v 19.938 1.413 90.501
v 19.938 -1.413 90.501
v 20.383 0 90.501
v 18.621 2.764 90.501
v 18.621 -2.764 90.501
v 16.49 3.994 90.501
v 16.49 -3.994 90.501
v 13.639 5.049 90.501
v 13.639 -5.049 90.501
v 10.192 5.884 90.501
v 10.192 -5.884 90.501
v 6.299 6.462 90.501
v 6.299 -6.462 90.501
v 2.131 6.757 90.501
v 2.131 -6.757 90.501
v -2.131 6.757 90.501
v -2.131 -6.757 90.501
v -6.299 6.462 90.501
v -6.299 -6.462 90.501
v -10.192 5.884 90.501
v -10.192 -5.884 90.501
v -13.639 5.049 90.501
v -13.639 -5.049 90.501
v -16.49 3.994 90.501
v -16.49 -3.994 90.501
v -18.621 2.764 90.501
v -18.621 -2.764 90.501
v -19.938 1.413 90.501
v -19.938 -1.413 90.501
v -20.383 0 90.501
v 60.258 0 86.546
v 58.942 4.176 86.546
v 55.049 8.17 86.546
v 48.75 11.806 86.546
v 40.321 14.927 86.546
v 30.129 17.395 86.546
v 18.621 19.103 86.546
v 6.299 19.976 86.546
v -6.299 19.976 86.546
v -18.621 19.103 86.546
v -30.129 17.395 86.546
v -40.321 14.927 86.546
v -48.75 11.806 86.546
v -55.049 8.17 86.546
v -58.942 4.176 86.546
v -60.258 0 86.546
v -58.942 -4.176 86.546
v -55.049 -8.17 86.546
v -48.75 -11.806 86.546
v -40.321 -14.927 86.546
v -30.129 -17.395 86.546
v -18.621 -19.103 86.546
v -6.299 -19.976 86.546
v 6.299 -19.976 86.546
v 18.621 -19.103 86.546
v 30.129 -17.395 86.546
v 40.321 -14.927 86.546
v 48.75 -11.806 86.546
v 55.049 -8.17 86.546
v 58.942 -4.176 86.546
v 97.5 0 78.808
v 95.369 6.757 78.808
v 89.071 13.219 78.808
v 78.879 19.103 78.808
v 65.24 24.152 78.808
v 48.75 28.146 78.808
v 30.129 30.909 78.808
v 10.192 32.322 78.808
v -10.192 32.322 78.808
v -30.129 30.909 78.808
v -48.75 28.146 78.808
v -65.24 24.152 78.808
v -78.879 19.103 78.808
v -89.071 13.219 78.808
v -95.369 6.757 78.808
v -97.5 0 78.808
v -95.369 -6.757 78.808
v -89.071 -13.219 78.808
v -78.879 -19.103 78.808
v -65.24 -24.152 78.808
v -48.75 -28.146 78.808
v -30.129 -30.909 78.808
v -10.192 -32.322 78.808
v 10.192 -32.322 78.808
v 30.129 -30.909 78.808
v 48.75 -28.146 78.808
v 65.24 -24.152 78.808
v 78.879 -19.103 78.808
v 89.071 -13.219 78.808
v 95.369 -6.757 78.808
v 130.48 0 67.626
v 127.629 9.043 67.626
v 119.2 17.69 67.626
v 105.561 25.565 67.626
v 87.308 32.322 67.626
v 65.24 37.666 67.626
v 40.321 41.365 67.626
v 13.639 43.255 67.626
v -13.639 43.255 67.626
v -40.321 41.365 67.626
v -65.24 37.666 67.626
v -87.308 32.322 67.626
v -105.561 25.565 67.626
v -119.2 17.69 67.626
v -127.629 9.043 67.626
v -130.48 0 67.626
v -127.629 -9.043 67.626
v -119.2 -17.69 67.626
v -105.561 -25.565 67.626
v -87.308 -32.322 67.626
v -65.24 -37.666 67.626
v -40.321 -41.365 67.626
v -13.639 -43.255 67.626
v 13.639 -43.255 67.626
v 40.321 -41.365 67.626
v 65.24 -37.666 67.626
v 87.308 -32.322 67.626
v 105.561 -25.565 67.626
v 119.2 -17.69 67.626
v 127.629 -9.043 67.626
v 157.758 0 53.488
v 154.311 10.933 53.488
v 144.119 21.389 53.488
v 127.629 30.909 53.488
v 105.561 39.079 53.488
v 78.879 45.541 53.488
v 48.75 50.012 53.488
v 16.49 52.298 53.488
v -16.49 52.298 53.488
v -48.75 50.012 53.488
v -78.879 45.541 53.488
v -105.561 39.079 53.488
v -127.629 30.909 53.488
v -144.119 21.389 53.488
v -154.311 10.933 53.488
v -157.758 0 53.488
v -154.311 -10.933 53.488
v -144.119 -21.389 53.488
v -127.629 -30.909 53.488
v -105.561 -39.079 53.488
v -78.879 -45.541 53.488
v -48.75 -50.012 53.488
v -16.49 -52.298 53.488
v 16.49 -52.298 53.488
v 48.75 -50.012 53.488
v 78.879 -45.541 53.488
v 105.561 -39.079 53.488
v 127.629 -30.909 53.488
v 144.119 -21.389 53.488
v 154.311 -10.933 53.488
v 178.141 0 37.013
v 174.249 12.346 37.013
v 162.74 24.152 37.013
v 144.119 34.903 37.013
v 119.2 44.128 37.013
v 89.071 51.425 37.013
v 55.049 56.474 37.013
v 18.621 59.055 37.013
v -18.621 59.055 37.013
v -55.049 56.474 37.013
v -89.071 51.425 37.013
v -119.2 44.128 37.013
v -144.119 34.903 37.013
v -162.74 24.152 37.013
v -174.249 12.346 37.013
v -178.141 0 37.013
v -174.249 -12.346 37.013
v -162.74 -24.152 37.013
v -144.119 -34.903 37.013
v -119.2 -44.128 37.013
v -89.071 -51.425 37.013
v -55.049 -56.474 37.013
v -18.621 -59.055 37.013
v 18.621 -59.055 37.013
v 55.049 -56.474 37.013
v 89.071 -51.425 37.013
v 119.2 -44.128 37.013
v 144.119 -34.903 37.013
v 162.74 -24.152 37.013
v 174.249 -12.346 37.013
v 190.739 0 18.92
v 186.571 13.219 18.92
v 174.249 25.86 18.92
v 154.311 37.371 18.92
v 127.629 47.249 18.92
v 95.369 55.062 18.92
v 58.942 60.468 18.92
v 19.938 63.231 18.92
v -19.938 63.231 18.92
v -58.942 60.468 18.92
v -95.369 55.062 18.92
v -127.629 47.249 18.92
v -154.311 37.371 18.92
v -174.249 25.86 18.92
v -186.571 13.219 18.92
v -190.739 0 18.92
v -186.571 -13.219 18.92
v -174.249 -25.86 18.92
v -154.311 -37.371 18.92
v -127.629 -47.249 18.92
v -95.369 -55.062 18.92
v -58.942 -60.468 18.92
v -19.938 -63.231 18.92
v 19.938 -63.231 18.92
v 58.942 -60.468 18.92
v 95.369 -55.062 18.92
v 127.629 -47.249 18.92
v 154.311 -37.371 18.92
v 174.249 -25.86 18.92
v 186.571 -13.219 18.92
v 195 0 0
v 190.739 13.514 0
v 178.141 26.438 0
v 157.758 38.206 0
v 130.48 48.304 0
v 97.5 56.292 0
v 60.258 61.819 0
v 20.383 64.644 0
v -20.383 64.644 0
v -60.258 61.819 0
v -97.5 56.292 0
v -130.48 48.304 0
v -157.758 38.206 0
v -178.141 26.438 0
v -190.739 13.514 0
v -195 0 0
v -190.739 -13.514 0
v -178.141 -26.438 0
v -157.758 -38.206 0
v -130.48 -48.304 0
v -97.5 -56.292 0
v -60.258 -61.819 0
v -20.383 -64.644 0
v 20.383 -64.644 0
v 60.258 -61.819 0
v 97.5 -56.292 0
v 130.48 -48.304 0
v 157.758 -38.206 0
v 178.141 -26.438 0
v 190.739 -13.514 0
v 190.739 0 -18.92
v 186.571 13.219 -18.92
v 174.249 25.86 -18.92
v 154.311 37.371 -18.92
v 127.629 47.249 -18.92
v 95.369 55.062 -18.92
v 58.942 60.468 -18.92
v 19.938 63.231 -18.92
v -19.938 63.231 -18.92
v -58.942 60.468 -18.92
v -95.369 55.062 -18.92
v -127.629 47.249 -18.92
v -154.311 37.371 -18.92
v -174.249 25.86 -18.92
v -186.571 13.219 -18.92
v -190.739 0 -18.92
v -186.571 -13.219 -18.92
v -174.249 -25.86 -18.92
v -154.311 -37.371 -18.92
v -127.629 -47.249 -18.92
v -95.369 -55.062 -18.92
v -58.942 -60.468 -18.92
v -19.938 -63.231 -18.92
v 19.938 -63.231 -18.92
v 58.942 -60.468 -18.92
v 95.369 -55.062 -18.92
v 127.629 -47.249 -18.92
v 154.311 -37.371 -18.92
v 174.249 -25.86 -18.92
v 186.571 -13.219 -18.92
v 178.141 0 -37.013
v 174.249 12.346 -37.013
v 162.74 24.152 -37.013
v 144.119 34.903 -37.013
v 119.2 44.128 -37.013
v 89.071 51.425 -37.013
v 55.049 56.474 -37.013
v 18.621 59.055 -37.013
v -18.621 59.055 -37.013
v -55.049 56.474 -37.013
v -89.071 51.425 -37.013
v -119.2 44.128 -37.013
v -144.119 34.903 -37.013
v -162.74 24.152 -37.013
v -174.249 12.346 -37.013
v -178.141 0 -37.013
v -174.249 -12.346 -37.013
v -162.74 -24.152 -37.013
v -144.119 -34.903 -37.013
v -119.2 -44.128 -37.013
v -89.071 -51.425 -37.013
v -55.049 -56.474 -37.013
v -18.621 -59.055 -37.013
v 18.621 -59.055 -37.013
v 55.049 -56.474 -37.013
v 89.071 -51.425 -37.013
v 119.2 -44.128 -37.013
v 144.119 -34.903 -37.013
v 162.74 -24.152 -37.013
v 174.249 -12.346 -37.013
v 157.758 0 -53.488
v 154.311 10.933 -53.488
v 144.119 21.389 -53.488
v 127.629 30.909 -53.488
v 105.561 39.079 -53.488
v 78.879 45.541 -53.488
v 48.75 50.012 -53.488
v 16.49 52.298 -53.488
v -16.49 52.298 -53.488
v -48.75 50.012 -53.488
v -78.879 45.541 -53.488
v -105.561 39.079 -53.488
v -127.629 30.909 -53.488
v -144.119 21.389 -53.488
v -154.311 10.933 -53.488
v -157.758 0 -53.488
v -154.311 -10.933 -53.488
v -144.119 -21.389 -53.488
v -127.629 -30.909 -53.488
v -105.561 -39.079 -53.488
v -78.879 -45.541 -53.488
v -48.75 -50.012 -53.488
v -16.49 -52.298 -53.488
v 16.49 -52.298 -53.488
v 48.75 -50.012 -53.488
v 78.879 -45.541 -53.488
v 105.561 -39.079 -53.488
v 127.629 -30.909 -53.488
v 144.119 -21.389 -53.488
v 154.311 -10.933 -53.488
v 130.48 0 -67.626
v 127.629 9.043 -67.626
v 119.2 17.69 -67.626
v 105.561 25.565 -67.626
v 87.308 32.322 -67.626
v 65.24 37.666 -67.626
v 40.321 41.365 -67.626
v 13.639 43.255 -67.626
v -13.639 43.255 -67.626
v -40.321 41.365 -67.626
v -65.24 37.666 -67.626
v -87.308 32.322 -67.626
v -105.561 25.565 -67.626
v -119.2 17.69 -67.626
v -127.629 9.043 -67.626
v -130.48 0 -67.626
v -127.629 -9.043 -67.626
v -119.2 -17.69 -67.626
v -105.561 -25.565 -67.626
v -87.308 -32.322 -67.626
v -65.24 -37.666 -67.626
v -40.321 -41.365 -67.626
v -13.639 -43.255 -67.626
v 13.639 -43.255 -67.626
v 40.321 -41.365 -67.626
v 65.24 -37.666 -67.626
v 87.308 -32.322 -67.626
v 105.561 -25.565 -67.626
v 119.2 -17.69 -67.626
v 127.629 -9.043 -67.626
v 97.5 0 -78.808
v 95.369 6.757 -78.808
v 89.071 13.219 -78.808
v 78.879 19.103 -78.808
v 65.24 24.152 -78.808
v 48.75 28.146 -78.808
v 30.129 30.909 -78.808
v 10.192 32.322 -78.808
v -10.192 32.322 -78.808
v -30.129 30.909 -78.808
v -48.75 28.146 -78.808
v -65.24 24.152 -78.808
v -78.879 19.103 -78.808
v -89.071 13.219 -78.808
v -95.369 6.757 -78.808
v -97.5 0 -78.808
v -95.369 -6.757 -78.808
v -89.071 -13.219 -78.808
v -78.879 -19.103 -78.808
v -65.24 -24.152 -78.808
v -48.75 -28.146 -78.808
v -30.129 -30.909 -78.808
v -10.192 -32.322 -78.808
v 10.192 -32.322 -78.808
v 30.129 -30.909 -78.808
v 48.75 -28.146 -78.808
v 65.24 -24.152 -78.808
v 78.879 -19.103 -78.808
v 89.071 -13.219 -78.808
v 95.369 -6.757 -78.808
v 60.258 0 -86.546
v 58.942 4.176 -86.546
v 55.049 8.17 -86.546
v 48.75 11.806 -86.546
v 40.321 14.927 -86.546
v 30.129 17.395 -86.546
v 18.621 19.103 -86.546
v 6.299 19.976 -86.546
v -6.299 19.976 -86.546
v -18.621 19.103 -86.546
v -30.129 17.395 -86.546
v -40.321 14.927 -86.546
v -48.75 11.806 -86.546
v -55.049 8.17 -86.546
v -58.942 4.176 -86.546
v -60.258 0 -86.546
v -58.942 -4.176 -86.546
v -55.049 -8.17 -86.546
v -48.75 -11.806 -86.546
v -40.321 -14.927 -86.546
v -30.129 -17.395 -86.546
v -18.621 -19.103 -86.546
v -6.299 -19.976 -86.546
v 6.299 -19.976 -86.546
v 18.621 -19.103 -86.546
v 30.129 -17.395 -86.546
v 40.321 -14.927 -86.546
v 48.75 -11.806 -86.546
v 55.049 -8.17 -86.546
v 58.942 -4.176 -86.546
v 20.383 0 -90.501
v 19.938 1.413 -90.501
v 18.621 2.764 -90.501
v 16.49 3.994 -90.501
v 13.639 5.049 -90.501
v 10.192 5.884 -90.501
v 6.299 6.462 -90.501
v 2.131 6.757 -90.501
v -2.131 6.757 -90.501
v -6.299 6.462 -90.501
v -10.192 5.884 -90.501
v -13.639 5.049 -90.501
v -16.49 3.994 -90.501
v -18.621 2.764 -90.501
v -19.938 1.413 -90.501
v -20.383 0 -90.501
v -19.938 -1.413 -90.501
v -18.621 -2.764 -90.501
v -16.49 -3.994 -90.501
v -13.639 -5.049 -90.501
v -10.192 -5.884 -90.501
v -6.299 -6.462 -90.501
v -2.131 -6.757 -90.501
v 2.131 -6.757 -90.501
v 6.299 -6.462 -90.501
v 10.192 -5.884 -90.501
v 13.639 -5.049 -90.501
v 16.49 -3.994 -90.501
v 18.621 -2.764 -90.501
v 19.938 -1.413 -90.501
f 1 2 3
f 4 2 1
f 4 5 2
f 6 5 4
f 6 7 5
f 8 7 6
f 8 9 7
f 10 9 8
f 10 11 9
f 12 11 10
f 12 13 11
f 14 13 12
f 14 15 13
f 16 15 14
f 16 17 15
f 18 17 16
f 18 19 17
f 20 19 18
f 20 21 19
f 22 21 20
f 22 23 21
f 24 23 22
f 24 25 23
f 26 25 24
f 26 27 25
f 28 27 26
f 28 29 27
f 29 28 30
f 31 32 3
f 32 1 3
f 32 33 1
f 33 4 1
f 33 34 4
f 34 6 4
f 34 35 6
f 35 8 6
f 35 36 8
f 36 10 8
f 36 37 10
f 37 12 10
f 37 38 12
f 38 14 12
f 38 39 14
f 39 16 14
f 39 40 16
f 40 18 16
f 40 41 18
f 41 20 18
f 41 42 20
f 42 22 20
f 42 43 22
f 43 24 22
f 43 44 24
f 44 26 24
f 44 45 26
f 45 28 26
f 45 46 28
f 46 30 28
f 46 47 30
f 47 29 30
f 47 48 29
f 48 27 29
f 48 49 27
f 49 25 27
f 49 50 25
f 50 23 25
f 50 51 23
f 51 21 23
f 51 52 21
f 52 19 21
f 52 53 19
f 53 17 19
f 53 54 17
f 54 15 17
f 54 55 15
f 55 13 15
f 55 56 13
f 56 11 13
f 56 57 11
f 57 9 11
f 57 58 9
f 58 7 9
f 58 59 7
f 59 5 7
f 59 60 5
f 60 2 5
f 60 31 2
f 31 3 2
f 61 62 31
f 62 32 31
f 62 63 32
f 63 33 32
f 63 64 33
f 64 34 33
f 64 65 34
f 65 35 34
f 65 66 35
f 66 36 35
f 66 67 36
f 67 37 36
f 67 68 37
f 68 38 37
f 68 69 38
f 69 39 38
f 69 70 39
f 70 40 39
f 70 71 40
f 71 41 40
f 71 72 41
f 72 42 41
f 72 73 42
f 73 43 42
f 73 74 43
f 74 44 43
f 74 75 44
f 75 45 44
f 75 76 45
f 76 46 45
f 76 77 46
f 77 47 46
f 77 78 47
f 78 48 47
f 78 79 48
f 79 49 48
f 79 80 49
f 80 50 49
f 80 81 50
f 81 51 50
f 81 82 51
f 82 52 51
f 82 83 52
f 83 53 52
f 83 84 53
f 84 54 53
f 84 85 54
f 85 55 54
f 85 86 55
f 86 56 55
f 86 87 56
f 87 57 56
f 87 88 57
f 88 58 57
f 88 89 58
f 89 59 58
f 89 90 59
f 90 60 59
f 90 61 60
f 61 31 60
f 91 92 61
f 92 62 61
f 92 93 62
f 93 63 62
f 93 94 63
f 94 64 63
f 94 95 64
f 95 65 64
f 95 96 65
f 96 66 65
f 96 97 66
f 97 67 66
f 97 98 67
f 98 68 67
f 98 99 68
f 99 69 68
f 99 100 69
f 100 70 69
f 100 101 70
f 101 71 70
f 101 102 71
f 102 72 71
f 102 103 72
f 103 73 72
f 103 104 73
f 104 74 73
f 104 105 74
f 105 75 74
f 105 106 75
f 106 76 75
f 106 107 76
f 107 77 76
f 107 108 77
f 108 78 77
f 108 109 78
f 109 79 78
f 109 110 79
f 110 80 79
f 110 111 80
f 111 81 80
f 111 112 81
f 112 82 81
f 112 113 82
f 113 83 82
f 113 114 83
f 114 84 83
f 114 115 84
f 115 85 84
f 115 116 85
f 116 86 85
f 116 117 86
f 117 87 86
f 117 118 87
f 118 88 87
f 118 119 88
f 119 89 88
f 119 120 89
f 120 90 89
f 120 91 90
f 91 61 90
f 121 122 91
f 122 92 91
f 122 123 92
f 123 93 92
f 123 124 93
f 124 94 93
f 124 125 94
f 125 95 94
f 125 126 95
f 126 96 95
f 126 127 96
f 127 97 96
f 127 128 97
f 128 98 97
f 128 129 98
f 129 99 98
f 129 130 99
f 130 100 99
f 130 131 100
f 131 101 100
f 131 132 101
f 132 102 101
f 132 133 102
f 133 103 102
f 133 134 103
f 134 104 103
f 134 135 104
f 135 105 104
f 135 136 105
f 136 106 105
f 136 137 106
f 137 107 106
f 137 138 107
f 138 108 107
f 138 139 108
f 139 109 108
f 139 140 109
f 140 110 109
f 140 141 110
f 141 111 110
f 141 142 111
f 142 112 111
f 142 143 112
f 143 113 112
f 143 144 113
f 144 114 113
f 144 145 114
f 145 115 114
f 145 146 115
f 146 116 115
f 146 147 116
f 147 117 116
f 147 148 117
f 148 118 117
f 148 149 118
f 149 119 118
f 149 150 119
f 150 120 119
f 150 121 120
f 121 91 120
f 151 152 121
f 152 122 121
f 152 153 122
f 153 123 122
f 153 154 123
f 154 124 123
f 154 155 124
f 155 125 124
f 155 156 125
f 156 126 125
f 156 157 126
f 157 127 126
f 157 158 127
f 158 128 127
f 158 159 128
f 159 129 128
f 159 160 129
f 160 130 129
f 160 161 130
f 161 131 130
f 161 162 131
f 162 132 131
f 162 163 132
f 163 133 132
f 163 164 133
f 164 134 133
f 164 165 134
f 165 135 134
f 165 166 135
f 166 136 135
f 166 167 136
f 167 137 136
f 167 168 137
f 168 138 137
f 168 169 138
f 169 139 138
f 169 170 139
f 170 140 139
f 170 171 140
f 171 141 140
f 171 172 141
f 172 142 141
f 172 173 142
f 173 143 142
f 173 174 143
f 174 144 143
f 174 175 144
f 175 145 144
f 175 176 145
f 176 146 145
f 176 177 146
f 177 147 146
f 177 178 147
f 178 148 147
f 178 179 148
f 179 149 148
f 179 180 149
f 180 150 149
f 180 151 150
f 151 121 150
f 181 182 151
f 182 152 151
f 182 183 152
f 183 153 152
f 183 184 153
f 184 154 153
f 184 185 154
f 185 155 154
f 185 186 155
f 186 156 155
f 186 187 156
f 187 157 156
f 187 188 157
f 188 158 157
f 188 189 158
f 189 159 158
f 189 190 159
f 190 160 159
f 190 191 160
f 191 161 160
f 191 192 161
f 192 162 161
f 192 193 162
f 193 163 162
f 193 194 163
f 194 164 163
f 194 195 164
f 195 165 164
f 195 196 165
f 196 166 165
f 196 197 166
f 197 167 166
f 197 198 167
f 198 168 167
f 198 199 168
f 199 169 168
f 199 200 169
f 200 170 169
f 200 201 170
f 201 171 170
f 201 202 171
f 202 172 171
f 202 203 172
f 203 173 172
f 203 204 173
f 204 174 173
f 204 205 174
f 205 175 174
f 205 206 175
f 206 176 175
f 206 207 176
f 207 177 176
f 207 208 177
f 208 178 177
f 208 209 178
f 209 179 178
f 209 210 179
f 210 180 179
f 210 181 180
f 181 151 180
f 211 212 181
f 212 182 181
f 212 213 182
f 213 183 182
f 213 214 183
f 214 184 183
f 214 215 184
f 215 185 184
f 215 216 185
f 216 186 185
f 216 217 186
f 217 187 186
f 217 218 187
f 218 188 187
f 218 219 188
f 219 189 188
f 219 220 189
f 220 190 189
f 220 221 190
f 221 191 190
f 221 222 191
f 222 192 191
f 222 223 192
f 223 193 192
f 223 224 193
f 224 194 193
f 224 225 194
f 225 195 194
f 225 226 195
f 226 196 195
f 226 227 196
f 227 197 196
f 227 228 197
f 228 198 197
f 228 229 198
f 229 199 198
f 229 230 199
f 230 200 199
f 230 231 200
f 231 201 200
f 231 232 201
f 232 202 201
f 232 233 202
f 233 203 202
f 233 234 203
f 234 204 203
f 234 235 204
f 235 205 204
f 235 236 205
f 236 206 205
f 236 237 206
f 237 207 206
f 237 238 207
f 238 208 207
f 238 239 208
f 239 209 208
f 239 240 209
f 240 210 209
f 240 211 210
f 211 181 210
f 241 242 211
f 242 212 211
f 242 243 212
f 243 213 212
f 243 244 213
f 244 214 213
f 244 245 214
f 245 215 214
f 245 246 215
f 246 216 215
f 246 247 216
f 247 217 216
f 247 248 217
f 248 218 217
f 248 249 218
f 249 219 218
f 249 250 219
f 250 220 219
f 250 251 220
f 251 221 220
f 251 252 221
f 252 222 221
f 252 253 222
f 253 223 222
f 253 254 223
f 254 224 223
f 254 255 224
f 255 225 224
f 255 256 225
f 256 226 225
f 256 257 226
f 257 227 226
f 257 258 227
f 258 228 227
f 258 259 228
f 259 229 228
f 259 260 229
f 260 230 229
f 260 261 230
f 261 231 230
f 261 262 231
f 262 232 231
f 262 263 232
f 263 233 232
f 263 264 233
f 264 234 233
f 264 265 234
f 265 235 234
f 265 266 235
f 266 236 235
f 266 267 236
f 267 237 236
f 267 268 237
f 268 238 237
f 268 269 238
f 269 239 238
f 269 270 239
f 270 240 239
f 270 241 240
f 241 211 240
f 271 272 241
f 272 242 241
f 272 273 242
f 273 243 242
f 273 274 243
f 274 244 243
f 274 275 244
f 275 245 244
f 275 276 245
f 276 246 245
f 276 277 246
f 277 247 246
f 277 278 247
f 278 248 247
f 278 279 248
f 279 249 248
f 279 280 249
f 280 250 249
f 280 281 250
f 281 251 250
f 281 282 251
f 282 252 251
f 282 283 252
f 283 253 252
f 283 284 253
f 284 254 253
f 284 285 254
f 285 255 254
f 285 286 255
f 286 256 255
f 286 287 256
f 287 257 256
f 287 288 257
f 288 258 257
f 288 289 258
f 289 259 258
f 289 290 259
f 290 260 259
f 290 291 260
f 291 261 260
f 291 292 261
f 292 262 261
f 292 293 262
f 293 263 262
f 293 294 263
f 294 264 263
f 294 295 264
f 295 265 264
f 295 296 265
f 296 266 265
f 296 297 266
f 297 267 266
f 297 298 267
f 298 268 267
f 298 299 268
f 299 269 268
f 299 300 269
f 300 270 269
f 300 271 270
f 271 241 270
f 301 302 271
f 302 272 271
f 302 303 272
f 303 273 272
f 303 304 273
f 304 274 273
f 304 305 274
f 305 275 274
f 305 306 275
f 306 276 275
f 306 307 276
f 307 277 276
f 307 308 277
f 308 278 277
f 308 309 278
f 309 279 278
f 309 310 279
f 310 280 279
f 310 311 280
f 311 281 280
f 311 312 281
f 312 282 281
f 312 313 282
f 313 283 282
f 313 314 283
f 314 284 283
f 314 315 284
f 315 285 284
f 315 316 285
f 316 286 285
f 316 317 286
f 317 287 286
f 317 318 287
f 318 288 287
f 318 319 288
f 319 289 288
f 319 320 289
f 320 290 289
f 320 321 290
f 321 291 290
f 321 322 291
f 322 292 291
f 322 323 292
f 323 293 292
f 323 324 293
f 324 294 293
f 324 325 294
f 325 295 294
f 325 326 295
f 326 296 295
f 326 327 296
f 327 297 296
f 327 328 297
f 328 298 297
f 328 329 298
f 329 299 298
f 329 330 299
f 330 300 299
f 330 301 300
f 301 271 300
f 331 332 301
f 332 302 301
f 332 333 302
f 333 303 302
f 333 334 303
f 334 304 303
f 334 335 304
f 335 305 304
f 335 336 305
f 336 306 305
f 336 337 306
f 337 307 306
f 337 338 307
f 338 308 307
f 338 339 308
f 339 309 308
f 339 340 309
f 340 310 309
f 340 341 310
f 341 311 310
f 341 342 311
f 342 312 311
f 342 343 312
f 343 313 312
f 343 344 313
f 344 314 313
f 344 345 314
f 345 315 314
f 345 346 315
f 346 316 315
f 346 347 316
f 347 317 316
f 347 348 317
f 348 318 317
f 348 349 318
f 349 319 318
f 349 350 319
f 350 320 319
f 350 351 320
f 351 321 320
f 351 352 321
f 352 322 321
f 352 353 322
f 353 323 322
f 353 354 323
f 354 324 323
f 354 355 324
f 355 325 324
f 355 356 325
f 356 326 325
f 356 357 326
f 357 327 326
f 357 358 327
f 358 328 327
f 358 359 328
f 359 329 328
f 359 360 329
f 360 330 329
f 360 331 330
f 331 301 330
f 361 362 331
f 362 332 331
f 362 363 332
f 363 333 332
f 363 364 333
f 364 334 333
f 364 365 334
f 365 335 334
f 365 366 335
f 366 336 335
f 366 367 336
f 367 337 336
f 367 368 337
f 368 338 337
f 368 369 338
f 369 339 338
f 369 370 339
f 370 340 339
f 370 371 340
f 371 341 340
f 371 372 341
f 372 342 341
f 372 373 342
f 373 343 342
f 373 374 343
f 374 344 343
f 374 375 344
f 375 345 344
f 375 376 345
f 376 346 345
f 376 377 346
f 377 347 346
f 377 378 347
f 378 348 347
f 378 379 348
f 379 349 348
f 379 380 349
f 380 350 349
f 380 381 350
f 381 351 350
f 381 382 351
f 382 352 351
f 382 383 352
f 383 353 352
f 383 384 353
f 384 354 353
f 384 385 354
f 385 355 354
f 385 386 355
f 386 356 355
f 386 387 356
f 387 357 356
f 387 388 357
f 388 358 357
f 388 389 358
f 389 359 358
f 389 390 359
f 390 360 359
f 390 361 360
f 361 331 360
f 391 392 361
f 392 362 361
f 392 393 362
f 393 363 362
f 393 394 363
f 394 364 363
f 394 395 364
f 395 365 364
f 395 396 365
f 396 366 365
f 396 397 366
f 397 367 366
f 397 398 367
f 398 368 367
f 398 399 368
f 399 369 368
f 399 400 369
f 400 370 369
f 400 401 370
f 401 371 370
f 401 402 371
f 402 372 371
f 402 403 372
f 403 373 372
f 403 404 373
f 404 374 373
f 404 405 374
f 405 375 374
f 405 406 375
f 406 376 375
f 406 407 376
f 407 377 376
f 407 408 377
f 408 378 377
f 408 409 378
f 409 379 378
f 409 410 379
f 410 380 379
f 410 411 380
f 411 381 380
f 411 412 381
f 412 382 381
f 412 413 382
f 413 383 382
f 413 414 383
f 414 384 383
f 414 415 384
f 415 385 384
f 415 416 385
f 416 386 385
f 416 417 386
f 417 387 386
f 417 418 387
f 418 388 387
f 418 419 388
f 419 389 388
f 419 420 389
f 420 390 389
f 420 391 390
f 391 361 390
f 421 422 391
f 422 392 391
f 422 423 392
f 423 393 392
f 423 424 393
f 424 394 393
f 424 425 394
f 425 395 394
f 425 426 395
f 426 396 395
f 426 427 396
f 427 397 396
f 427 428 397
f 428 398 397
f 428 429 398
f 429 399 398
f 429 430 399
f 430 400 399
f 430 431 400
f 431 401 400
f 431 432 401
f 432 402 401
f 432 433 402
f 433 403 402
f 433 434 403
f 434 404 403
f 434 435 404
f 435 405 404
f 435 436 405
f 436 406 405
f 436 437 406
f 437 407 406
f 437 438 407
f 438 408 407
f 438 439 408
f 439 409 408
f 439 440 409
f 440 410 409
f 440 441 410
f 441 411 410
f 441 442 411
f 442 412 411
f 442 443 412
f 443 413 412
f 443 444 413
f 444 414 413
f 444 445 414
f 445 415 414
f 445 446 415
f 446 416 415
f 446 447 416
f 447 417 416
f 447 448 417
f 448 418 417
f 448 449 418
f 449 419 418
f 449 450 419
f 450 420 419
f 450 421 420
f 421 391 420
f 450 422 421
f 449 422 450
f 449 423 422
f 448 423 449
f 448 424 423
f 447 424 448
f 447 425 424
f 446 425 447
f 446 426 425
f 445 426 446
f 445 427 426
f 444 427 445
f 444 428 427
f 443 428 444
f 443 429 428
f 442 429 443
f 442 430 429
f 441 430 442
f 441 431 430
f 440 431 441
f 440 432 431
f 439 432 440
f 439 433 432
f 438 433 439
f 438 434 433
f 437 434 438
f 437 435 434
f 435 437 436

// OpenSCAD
// Generated by SolidPython 1.0.1 on 2020-07-29 00:46:51


scale(v = [15, 5, 7]) {
	sphere(r = 13);
}
/***********************************************
*********      SolidPython code:      **********
************************************************
 
# import packages: SolidPython
from solid import *
from solid.utils import *
from itertools import chain, combinations, permutations


class Resize:

    def __init__(self, scad_file):
        self.scad_file = scad_file
        #self.scad_file = import_scad(scad_file)
        # cone/cylinder param:
        self.r1 = 0
        self.r2 = 0
        self.h = 0
        # rectangular prism param:
        self.w = 0
        self.l = 0
        # ellipse param:
        self.r = 0

    # import OpenScad code (file name corresponds to shape)


    # classify shape + parameters
    def assign(self, param1, param2, param3):
        if self.scad_file == 'cone.scad':
            self.r1 = param1
            self.r2 = param2
            self.h = param3
        elif self.scad_file == 'cylinder.scad':
            self.r1 = param1
            self.r2 = param2
            self.h = param3
        elif self.scad_file == 'rectangularPrism.scad':
            self.h = param1
            self.l = param2
            self.w = param3
        else:
            self.r = param1
            self.h = param2

    # resize parameters
    def iterate(self):
        x = range(3, 20, 2)
        i = 1
        if self.scad_file == 'cone.scad':
            tempList = list(permutations(x, 2))
            for temp in tempList:
                param1 = temp[0]
                param2 = temp[1]
                filepath = 'produced_scad_files/' + 'cone' + str(param1) + '_' + str(param2) + '_' + '.scad'
                scad_render_to_file(cylinder(h=param1, r1=param2, r2=0), filepath)

        elif self.scad_file == 'cylinder.scad':
            tempList = list(permutations(x, 3))
            for temp in tempList:
                param1 = temp[0]
                param2 = temp[1]
                filepath = 'produced_scad_files/' + 'cylinder' + str(param1) + '_' + str(param2) + '_' + '.scad'
                scad_render_to_file(cylinder(h=param1, r1=param2, r2=param2), filepath)

        elif self.scad_file == 'rectangularPrism.scad':
            tempList = list(permutations(x, 3))
            for temp in tempList:
                param1 = temp[0]
                param2 = temp[1]
                param3 = temp[2]
                filepath = 'produced_scad_files/' + 'rectangularPrism' + str(param1) + '_' + str(param2) + '_' + str(
                    param3) + '.scad'
                scad_render_to_file(cube(size=(param1, param2, param3)), filepath)

        elif self.scad_file == 'ellipse.scad':
            tempList = list(permutations(x, 4))
            for temp in tempList:
                param1 = temp[0]
                param2 = temp[1]
                param3 = temp[2]
                param4 = temp[3]
                filepath = 'produced_scad_files/' + 'ellipse' + str(param1) + '_' + str(param2) + '_' + str(param3) + '_' + str(param4) + '.scad'
                scad_render_to_file(scale([param1, param2, param3])(sphere(r=param4)), filepath)

    def render_to_scadfile(self):
        scad_render_to_file(scad, 'example.scad') 
 
************************************************/
